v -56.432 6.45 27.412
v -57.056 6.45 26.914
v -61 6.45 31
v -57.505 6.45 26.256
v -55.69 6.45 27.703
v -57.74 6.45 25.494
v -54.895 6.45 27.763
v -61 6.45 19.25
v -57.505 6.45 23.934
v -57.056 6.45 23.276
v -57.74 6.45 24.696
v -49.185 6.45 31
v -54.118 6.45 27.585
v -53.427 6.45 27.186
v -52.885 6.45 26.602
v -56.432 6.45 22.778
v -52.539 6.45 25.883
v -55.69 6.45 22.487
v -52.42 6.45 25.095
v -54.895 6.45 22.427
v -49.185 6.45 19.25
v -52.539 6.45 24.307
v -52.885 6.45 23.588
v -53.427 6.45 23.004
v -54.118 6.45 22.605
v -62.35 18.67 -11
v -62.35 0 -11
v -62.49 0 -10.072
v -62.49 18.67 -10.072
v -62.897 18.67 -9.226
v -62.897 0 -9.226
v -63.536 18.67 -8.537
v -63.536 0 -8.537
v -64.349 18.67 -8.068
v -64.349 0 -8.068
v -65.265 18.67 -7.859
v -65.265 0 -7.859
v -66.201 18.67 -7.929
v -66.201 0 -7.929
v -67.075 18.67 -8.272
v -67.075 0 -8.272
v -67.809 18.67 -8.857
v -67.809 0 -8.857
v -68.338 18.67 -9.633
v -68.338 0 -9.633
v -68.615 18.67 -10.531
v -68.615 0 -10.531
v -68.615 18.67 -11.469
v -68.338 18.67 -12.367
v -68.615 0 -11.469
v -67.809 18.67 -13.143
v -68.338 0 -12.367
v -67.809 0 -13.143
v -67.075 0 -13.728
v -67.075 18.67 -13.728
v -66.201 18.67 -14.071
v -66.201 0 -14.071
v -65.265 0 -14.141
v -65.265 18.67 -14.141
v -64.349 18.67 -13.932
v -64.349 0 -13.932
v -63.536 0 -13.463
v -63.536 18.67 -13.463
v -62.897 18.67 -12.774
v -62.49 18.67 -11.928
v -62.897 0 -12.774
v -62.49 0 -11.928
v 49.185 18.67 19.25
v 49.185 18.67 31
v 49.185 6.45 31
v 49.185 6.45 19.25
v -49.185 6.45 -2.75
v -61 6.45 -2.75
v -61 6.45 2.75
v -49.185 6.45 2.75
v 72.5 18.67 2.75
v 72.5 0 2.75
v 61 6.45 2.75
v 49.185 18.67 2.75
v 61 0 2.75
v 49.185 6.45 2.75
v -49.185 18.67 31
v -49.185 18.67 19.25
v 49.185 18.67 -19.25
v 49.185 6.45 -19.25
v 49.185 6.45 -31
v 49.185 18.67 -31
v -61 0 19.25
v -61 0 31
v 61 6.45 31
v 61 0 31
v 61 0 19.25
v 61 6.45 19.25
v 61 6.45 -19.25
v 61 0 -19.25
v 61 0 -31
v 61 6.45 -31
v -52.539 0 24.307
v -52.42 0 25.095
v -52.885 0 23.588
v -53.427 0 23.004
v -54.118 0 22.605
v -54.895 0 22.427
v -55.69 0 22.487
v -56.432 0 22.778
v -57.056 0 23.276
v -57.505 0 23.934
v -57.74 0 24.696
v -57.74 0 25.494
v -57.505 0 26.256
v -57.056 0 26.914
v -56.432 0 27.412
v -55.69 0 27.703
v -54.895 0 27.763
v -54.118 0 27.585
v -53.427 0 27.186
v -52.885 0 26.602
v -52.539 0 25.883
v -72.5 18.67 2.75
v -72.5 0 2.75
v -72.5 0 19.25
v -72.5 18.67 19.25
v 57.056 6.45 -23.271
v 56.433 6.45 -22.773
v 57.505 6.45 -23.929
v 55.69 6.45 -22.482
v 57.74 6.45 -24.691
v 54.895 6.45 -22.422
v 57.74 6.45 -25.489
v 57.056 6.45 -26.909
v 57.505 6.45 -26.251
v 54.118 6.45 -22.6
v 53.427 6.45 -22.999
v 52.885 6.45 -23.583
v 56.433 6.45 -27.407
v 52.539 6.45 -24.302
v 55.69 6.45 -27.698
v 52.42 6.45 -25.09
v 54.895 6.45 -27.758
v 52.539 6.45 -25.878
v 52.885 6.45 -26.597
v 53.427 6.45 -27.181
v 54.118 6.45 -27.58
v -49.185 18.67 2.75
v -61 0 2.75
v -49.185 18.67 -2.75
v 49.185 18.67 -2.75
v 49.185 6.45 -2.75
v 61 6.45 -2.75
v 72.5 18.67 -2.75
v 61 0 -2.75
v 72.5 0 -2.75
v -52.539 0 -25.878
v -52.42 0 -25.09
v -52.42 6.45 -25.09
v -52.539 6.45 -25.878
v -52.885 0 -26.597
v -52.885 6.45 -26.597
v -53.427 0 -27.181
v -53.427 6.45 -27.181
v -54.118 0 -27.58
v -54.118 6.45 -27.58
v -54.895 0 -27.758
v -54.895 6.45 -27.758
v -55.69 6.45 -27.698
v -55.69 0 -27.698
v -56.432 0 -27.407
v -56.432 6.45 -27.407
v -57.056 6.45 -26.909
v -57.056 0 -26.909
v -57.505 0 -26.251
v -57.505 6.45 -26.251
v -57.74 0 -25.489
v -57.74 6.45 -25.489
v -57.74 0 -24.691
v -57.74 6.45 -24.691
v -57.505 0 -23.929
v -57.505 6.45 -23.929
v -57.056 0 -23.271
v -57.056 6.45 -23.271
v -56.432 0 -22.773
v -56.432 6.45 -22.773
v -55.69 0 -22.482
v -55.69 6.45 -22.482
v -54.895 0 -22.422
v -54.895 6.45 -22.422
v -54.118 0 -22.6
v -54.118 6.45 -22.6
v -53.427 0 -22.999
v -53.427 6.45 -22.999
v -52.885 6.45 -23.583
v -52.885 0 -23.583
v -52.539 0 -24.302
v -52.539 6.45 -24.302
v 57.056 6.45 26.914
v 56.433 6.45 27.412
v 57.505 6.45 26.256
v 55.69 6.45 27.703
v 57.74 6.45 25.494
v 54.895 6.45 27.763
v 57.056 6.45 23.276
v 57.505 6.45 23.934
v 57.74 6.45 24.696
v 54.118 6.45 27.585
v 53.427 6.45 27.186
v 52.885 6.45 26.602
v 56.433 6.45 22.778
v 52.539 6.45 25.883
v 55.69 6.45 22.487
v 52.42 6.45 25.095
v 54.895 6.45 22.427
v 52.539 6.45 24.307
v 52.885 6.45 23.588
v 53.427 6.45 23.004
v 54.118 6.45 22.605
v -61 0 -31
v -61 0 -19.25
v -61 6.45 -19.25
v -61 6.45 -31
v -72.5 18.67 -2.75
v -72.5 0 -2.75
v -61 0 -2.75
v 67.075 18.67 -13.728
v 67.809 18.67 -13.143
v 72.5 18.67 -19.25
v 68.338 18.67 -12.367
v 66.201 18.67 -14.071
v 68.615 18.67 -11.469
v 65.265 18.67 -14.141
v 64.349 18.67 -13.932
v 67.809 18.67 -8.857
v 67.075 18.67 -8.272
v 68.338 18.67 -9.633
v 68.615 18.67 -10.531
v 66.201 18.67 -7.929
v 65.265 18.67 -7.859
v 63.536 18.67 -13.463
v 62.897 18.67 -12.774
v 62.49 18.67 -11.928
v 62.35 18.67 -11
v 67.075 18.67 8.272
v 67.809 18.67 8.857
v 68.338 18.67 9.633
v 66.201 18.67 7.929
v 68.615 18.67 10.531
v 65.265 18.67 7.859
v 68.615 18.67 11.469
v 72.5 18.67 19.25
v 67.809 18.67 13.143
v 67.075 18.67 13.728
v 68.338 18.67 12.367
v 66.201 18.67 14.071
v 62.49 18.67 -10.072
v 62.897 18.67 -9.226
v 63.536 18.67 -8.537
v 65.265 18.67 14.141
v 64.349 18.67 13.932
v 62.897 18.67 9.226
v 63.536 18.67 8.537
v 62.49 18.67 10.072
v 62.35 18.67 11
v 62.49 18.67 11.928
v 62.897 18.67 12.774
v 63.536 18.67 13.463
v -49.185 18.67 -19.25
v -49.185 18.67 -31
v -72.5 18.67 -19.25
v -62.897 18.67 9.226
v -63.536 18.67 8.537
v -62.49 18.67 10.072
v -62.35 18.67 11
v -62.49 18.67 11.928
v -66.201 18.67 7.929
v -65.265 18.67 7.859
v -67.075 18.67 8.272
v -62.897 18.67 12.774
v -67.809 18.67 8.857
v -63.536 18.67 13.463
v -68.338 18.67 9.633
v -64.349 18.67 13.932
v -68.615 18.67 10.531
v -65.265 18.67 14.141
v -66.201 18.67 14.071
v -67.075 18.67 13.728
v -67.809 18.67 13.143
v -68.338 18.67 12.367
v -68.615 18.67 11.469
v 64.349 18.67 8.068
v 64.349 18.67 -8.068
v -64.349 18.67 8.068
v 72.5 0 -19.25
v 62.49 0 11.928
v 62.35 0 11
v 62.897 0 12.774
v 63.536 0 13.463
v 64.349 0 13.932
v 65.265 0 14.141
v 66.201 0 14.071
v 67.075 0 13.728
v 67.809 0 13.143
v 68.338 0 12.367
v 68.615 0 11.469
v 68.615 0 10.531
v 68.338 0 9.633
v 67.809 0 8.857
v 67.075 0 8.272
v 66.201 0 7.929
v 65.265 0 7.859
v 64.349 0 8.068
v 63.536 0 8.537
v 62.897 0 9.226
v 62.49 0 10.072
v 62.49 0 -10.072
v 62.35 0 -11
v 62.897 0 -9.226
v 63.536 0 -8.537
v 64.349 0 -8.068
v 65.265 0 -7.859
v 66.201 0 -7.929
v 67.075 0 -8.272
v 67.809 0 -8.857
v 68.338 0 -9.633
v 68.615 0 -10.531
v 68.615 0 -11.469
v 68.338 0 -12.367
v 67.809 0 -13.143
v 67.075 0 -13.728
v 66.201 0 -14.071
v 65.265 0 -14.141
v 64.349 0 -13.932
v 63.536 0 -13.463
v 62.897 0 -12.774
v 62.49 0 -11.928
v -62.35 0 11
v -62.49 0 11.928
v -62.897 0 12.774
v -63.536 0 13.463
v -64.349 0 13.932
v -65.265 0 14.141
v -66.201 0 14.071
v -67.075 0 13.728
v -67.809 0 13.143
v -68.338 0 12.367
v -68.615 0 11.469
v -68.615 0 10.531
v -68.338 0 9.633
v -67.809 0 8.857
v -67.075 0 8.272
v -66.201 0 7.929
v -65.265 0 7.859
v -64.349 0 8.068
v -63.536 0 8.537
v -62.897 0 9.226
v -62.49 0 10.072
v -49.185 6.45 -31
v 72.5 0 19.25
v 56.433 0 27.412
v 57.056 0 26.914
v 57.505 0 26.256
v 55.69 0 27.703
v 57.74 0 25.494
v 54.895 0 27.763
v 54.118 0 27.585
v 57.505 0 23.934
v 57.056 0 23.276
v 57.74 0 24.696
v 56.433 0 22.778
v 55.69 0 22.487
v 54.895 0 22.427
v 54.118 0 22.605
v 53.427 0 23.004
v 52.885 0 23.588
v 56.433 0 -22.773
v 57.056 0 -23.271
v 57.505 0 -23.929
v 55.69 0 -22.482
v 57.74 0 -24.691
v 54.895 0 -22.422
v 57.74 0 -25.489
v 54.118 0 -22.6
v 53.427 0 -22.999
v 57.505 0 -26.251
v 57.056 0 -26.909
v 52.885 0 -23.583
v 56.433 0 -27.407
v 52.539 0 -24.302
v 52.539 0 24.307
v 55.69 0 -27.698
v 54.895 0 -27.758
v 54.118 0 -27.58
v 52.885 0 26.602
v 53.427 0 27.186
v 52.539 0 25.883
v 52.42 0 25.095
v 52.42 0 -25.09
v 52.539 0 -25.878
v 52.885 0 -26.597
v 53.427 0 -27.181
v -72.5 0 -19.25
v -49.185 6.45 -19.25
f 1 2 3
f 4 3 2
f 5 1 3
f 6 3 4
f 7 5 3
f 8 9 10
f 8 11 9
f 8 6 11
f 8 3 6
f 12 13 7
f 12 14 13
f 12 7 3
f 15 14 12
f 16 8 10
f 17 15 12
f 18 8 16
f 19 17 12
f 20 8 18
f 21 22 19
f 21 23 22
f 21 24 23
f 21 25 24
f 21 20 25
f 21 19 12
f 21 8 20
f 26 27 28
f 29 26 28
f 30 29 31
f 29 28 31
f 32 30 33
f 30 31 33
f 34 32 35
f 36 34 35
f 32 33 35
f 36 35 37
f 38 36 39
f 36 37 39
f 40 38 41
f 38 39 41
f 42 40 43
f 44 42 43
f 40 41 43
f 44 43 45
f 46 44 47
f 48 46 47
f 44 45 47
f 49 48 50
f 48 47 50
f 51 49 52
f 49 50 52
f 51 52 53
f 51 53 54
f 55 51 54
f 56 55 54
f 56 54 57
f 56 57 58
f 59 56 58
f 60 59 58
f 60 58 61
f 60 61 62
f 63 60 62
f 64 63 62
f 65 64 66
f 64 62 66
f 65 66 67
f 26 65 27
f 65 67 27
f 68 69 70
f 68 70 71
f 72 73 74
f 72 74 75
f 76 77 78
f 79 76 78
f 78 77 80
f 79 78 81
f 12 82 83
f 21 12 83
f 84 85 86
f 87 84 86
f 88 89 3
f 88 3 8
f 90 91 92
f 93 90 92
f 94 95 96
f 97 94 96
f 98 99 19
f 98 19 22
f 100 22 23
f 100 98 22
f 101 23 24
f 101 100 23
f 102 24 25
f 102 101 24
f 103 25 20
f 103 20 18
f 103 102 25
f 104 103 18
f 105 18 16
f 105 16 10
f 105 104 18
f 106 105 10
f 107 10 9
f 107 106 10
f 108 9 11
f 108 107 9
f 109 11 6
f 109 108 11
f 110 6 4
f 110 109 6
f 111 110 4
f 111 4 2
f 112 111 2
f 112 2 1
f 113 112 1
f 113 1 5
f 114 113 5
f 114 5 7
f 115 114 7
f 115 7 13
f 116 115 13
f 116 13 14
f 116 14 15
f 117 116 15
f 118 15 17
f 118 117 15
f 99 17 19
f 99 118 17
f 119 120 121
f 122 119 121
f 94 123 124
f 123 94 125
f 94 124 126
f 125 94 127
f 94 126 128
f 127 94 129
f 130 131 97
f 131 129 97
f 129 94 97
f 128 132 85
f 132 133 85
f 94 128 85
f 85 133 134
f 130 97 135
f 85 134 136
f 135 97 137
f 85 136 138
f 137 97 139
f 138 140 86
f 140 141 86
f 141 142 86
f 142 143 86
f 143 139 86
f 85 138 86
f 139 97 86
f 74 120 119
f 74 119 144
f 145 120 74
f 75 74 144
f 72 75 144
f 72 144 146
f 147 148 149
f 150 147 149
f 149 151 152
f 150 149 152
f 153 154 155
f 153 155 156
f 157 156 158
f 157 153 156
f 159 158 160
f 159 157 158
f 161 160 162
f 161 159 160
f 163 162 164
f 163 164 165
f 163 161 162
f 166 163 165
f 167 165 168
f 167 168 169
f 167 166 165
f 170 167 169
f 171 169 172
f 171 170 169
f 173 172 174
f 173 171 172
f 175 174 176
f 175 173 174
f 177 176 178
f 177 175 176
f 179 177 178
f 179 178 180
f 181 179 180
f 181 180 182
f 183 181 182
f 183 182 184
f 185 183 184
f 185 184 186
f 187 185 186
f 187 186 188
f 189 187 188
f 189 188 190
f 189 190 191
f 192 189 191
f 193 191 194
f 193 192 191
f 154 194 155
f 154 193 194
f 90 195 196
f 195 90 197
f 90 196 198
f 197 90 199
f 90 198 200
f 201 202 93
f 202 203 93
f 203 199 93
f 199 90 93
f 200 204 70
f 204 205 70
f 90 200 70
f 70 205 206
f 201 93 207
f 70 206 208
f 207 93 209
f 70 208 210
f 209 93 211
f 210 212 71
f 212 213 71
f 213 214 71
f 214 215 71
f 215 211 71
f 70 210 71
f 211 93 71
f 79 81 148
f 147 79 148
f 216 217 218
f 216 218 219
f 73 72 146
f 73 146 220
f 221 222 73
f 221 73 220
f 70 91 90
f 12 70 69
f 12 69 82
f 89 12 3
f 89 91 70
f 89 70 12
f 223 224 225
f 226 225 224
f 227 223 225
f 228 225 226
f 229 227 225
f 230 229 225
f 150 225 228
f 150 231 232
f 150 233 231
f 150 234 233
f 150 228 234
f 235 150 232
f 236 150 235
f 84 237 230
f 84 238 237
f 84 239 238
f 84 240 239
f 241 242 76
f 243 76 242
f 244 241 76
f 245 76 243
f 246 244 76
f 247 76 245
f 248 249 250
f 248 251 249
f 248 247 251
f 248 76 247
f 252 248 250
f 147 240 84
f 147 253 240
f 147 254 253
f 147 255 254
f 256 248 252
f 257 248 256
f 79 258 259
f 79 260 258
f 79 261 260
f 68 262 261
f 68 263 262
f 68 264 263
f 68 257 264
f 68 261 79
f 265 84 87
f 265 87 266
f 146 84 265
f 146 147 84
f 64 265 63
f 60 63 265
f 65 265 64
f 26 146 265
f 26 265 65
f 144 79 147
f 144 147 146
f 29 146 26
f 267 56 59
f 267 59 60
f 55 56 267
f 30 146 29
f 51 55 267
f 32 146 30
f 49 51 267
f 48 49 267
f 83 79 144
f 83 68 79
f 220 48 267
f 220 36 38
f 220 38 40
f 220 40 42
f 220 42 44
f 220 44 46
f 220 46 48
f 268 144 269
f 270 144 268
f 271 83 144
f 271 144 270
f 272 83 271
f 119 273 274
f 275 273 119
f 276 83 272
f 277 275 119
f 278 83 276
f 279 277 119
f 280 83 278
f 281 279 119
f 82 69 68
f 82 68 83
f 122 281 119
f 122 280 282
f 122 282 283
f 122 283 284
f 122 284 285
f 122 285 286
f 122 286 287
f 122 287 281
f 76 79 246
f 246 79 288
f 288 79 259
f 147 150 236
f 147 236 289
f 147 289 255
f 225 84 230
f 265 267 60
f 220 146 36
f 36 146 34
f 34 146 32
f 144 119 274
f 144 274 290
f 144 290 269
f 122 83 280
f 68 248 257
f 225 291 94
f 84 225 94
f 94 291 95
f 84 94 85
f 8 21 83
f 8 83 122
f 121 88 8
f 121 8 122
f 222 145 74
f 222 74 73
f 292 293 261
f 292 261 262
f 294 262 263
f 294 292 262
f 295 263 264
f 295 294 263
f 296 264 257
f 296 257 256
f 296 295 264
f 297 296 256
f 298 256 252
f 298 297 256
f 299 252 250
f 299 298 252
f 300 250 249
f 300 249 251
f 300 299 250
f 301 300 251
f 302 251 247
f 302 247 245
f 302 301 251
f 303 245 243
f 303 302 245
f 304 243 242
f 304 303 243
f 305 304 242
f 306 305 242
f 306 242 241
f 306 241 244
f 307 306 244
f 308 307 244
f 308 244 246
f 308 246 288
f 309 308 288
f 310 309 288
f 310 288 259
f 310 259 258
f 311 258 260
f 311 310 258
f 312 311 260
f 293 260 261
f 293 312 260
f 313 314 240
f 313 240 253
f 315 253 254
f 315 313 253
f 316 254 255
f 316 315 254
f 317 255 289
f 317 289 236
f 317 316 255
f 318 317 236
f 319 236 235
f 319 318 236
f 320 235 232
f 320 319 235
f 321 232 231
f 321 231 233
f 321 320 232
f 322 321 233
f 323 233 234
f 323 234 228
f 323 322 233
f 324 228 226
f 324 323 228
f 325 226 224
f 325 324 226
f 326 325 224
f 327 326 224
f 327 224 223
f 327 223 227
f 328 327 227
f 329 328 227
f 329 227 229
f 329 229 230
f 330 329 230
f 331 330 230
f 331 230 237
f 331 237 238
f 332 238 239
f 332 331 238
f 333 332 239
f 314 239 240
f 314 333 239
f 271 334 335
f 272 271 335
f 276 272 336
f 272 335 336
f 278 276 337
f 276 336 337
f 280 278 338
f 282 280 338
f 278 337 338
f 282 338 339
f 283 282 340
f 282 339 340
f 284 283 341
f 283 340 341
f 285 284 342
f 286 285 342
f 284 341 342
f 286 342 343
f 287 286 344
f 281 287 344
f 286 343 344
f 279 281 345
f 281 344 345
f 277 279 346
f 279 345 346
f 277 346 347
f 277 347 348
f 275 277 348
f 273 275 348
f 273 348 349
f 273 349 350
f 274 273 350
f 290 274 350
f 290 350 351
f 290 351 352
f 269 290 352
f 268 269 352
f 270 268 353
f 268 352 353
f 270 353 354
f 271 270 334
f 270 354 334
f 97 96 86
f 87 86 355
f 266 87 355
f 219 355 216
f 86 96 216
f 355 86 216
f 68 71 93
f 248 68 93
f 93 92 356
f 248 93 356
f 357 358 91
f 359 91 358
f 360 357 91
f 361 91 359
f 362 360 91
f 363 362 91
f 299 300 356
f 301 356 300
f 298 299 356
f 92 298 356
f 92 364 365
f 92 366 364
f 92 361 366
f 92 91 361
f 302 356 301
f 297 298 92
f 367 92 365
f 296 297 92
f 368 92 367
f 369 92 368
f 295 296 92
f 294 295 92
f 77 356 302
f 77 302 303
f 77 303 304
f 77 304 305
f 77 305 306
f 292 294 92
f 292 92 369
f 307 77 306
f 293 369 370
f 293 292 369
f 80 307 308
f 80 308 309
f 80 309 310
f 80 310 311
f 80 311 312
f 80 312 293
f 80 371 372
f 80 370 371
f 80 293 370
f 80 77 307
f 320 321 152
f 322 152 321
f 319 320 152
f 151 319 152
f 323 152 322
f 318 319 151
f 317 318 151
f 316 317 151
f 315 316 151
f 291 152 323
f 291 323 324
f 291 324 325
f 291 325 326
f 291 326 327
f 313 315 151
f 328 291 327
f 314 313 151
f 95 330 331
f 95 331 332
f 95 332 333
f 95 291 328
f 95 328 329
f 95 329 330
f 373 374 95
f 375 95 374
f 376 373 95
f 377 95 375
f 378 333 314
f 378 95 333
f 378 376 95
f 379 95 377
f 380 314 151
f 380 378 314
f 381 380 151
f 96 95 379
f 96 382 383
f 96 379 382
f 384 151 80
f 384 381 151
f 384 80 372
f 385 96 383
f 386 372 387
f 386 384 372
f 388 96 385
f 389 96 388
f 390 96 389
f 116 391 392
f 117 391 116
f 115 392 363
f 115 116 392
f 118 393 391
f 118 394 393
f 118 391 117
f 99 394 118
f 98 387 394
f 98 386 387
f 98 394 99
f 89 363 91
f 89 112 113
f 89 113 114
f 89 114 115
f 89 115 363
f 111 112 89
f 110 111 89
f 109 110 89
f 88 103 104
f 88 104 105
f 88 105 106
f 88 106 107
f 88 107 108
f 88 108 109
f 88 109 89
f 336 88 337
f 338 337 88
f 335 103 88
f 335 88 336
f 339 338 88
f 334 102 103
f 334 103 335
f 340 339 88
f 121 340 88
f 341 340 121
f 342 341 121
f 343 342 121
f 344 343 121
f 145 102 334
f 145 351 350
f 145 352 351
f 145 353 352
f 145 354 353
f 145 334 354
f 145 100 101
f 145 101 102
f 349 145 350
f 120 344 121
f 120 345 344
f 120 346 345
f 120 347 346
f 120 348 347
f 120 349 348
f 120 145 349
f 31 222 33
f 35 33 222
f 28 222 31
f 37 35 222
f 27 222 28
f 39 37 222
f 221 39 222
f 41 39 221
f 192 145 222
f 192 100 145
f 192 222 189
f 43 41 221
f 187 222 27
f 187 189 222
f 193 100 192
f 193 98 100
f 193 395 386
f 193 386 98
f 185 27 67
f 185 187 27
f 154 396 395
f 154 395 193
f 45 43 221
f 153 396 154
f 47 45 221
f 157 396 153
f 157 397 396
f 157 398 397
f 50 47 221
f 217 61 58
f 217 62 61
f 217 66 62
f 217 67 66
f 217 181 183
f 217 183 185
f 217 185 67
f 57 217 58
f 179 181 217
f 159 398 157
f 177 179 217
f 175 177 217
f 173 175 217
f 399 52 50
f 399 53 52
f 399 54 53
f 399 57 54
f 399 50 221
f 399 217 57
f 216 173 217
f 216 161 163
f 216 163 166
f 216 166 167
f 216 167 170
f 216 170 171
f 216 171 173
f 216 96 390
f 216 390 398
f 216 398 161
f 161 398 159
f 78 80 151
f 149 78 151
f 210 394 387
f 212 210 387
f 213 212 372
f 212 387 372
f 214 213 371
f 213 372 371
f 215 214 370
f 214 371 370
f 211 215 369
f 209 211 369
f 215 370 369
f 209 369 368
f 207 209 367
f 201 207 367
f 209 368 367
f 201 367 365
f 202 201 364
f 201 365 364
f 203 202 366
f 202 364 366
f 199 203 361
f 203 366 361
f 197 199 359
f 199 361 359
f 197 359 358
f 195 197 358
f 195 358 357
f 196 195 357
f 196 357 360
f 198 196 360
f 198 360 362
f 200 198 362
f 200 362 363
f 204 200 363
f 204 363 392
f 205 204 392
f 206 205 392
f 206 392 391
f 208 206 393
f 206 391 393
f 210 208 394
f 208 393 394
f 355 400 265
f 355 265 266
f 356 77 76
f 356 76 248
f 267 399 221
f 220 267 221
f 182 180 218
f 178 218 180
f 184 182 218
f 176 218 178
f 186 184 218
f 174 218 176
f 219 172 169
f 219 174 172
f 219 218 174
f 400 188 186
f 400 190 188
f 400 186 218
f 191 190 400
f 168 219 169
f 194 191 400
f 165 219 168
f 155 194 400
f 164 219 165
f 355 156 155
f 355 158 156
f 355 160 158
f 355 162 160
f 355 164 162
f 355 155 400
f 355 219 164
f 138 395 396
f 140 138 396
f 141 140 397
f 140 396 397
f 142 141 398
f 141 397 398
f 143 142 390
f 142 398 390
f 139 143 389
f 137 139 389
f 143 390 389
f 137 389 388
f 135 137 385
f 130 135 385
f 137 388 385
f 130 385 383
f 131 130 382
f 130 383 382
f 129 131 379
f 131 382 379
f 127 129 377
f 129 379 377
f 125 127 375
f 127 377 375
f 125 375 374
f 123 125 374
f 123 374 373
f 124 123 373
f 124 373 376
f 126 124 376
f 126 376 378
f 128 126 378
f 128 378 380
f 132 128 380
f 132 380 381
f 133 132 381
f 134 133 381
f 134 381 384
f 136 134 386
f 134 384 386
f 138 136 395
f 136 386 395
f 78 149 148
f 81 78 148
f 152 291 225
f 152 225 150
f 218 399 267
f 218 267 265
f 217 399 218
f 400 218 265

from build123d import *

# Parameters (mm, degrees)
SKETCH1_W           = 61
SKETCH1_H           = 62
SKETCH1_R           = 2.675
BASE_DEPTH          = 6.45
SKETCH2_W           = 49.185
SKETCH2_H           = 62
SEMICONDUCTOR_DEPTH = 12.22
SKETCH3_W           = 11.815
SKETCH3_H           = 16.5
SKETCH3_W_2         = 11.5
SKETCH3_R           = 3.15
TABS_DEPTH          = 18.67


with BuildPart() as part:
    # Sketch1 → Base (new body)
    with BuildSketch(Plane(origin=(0, 0, 0), x_dir=(1, 0, 0), z_dir=(0, 1, 0))):
        with Locations((-30.5, 0)):
            Rectangle(SKETCH1_W, SKETCH1_H)
        with Locations((-55.095, -25.095)):
            Circle(SKETCH1_R, mode=Mode.SUBTRACT)
        with Locations((-55.095, 25.09)):
            Circle(SKETCH1_R, mode=Mode.SUBTRACT)
    extrude(amount=BASE_DEPTH)

    # Sketch2 → Semiconductor (add)
    with BuildSketch(Plane(origin=(0, 6.45, 0), x_dir=(1, 0, 0), z_dir=(0, 1, 0))):
        with Locations((-24.5925, 0)):
            Rectangle(SKETCH2_W, SKETCH2_H)
    extrude(amount=SEMICONDUCTOR_DEPTH)

    # Sketch3 → Tabs (add)
    with BuildSketch(Plane.XZ):
        with Locations((-55.0925, 11)):
            Rectangle(SKETCH3_W, SKETCH3_H)
        with Locations((-55.0925, -11)):
            Rectangle(SKETCH3_W, SKETCH3_H)
        with Locations((-66.75, -11)):
            Rectangle(SKETCH3_W_2, SKETCH3_H)
        with Locations((-65.5, -11)):
            Circle(SKETCH3_R, mode=Mode.SUBTRACT)
        with Locations((-66.75, 11)):
            Rectangle(SKETCH3_W_2, SKETCH3_H)
        with Locations((-65.5, 11)):
            Circle(SKETCH3_R, mode=Mode.SUBTRACT)
    extrude(amount=-TABS_DEPTH)

    # Mirror 2: part across plane


with BuildPart() as part_1:
    add(part.part)
    add(part.part.mirror(Plane(origin=(0, 6.45, 0), x_dir=(0, 0, 1), z_dir=(1, 0, 0))))


solid = part_1.part
